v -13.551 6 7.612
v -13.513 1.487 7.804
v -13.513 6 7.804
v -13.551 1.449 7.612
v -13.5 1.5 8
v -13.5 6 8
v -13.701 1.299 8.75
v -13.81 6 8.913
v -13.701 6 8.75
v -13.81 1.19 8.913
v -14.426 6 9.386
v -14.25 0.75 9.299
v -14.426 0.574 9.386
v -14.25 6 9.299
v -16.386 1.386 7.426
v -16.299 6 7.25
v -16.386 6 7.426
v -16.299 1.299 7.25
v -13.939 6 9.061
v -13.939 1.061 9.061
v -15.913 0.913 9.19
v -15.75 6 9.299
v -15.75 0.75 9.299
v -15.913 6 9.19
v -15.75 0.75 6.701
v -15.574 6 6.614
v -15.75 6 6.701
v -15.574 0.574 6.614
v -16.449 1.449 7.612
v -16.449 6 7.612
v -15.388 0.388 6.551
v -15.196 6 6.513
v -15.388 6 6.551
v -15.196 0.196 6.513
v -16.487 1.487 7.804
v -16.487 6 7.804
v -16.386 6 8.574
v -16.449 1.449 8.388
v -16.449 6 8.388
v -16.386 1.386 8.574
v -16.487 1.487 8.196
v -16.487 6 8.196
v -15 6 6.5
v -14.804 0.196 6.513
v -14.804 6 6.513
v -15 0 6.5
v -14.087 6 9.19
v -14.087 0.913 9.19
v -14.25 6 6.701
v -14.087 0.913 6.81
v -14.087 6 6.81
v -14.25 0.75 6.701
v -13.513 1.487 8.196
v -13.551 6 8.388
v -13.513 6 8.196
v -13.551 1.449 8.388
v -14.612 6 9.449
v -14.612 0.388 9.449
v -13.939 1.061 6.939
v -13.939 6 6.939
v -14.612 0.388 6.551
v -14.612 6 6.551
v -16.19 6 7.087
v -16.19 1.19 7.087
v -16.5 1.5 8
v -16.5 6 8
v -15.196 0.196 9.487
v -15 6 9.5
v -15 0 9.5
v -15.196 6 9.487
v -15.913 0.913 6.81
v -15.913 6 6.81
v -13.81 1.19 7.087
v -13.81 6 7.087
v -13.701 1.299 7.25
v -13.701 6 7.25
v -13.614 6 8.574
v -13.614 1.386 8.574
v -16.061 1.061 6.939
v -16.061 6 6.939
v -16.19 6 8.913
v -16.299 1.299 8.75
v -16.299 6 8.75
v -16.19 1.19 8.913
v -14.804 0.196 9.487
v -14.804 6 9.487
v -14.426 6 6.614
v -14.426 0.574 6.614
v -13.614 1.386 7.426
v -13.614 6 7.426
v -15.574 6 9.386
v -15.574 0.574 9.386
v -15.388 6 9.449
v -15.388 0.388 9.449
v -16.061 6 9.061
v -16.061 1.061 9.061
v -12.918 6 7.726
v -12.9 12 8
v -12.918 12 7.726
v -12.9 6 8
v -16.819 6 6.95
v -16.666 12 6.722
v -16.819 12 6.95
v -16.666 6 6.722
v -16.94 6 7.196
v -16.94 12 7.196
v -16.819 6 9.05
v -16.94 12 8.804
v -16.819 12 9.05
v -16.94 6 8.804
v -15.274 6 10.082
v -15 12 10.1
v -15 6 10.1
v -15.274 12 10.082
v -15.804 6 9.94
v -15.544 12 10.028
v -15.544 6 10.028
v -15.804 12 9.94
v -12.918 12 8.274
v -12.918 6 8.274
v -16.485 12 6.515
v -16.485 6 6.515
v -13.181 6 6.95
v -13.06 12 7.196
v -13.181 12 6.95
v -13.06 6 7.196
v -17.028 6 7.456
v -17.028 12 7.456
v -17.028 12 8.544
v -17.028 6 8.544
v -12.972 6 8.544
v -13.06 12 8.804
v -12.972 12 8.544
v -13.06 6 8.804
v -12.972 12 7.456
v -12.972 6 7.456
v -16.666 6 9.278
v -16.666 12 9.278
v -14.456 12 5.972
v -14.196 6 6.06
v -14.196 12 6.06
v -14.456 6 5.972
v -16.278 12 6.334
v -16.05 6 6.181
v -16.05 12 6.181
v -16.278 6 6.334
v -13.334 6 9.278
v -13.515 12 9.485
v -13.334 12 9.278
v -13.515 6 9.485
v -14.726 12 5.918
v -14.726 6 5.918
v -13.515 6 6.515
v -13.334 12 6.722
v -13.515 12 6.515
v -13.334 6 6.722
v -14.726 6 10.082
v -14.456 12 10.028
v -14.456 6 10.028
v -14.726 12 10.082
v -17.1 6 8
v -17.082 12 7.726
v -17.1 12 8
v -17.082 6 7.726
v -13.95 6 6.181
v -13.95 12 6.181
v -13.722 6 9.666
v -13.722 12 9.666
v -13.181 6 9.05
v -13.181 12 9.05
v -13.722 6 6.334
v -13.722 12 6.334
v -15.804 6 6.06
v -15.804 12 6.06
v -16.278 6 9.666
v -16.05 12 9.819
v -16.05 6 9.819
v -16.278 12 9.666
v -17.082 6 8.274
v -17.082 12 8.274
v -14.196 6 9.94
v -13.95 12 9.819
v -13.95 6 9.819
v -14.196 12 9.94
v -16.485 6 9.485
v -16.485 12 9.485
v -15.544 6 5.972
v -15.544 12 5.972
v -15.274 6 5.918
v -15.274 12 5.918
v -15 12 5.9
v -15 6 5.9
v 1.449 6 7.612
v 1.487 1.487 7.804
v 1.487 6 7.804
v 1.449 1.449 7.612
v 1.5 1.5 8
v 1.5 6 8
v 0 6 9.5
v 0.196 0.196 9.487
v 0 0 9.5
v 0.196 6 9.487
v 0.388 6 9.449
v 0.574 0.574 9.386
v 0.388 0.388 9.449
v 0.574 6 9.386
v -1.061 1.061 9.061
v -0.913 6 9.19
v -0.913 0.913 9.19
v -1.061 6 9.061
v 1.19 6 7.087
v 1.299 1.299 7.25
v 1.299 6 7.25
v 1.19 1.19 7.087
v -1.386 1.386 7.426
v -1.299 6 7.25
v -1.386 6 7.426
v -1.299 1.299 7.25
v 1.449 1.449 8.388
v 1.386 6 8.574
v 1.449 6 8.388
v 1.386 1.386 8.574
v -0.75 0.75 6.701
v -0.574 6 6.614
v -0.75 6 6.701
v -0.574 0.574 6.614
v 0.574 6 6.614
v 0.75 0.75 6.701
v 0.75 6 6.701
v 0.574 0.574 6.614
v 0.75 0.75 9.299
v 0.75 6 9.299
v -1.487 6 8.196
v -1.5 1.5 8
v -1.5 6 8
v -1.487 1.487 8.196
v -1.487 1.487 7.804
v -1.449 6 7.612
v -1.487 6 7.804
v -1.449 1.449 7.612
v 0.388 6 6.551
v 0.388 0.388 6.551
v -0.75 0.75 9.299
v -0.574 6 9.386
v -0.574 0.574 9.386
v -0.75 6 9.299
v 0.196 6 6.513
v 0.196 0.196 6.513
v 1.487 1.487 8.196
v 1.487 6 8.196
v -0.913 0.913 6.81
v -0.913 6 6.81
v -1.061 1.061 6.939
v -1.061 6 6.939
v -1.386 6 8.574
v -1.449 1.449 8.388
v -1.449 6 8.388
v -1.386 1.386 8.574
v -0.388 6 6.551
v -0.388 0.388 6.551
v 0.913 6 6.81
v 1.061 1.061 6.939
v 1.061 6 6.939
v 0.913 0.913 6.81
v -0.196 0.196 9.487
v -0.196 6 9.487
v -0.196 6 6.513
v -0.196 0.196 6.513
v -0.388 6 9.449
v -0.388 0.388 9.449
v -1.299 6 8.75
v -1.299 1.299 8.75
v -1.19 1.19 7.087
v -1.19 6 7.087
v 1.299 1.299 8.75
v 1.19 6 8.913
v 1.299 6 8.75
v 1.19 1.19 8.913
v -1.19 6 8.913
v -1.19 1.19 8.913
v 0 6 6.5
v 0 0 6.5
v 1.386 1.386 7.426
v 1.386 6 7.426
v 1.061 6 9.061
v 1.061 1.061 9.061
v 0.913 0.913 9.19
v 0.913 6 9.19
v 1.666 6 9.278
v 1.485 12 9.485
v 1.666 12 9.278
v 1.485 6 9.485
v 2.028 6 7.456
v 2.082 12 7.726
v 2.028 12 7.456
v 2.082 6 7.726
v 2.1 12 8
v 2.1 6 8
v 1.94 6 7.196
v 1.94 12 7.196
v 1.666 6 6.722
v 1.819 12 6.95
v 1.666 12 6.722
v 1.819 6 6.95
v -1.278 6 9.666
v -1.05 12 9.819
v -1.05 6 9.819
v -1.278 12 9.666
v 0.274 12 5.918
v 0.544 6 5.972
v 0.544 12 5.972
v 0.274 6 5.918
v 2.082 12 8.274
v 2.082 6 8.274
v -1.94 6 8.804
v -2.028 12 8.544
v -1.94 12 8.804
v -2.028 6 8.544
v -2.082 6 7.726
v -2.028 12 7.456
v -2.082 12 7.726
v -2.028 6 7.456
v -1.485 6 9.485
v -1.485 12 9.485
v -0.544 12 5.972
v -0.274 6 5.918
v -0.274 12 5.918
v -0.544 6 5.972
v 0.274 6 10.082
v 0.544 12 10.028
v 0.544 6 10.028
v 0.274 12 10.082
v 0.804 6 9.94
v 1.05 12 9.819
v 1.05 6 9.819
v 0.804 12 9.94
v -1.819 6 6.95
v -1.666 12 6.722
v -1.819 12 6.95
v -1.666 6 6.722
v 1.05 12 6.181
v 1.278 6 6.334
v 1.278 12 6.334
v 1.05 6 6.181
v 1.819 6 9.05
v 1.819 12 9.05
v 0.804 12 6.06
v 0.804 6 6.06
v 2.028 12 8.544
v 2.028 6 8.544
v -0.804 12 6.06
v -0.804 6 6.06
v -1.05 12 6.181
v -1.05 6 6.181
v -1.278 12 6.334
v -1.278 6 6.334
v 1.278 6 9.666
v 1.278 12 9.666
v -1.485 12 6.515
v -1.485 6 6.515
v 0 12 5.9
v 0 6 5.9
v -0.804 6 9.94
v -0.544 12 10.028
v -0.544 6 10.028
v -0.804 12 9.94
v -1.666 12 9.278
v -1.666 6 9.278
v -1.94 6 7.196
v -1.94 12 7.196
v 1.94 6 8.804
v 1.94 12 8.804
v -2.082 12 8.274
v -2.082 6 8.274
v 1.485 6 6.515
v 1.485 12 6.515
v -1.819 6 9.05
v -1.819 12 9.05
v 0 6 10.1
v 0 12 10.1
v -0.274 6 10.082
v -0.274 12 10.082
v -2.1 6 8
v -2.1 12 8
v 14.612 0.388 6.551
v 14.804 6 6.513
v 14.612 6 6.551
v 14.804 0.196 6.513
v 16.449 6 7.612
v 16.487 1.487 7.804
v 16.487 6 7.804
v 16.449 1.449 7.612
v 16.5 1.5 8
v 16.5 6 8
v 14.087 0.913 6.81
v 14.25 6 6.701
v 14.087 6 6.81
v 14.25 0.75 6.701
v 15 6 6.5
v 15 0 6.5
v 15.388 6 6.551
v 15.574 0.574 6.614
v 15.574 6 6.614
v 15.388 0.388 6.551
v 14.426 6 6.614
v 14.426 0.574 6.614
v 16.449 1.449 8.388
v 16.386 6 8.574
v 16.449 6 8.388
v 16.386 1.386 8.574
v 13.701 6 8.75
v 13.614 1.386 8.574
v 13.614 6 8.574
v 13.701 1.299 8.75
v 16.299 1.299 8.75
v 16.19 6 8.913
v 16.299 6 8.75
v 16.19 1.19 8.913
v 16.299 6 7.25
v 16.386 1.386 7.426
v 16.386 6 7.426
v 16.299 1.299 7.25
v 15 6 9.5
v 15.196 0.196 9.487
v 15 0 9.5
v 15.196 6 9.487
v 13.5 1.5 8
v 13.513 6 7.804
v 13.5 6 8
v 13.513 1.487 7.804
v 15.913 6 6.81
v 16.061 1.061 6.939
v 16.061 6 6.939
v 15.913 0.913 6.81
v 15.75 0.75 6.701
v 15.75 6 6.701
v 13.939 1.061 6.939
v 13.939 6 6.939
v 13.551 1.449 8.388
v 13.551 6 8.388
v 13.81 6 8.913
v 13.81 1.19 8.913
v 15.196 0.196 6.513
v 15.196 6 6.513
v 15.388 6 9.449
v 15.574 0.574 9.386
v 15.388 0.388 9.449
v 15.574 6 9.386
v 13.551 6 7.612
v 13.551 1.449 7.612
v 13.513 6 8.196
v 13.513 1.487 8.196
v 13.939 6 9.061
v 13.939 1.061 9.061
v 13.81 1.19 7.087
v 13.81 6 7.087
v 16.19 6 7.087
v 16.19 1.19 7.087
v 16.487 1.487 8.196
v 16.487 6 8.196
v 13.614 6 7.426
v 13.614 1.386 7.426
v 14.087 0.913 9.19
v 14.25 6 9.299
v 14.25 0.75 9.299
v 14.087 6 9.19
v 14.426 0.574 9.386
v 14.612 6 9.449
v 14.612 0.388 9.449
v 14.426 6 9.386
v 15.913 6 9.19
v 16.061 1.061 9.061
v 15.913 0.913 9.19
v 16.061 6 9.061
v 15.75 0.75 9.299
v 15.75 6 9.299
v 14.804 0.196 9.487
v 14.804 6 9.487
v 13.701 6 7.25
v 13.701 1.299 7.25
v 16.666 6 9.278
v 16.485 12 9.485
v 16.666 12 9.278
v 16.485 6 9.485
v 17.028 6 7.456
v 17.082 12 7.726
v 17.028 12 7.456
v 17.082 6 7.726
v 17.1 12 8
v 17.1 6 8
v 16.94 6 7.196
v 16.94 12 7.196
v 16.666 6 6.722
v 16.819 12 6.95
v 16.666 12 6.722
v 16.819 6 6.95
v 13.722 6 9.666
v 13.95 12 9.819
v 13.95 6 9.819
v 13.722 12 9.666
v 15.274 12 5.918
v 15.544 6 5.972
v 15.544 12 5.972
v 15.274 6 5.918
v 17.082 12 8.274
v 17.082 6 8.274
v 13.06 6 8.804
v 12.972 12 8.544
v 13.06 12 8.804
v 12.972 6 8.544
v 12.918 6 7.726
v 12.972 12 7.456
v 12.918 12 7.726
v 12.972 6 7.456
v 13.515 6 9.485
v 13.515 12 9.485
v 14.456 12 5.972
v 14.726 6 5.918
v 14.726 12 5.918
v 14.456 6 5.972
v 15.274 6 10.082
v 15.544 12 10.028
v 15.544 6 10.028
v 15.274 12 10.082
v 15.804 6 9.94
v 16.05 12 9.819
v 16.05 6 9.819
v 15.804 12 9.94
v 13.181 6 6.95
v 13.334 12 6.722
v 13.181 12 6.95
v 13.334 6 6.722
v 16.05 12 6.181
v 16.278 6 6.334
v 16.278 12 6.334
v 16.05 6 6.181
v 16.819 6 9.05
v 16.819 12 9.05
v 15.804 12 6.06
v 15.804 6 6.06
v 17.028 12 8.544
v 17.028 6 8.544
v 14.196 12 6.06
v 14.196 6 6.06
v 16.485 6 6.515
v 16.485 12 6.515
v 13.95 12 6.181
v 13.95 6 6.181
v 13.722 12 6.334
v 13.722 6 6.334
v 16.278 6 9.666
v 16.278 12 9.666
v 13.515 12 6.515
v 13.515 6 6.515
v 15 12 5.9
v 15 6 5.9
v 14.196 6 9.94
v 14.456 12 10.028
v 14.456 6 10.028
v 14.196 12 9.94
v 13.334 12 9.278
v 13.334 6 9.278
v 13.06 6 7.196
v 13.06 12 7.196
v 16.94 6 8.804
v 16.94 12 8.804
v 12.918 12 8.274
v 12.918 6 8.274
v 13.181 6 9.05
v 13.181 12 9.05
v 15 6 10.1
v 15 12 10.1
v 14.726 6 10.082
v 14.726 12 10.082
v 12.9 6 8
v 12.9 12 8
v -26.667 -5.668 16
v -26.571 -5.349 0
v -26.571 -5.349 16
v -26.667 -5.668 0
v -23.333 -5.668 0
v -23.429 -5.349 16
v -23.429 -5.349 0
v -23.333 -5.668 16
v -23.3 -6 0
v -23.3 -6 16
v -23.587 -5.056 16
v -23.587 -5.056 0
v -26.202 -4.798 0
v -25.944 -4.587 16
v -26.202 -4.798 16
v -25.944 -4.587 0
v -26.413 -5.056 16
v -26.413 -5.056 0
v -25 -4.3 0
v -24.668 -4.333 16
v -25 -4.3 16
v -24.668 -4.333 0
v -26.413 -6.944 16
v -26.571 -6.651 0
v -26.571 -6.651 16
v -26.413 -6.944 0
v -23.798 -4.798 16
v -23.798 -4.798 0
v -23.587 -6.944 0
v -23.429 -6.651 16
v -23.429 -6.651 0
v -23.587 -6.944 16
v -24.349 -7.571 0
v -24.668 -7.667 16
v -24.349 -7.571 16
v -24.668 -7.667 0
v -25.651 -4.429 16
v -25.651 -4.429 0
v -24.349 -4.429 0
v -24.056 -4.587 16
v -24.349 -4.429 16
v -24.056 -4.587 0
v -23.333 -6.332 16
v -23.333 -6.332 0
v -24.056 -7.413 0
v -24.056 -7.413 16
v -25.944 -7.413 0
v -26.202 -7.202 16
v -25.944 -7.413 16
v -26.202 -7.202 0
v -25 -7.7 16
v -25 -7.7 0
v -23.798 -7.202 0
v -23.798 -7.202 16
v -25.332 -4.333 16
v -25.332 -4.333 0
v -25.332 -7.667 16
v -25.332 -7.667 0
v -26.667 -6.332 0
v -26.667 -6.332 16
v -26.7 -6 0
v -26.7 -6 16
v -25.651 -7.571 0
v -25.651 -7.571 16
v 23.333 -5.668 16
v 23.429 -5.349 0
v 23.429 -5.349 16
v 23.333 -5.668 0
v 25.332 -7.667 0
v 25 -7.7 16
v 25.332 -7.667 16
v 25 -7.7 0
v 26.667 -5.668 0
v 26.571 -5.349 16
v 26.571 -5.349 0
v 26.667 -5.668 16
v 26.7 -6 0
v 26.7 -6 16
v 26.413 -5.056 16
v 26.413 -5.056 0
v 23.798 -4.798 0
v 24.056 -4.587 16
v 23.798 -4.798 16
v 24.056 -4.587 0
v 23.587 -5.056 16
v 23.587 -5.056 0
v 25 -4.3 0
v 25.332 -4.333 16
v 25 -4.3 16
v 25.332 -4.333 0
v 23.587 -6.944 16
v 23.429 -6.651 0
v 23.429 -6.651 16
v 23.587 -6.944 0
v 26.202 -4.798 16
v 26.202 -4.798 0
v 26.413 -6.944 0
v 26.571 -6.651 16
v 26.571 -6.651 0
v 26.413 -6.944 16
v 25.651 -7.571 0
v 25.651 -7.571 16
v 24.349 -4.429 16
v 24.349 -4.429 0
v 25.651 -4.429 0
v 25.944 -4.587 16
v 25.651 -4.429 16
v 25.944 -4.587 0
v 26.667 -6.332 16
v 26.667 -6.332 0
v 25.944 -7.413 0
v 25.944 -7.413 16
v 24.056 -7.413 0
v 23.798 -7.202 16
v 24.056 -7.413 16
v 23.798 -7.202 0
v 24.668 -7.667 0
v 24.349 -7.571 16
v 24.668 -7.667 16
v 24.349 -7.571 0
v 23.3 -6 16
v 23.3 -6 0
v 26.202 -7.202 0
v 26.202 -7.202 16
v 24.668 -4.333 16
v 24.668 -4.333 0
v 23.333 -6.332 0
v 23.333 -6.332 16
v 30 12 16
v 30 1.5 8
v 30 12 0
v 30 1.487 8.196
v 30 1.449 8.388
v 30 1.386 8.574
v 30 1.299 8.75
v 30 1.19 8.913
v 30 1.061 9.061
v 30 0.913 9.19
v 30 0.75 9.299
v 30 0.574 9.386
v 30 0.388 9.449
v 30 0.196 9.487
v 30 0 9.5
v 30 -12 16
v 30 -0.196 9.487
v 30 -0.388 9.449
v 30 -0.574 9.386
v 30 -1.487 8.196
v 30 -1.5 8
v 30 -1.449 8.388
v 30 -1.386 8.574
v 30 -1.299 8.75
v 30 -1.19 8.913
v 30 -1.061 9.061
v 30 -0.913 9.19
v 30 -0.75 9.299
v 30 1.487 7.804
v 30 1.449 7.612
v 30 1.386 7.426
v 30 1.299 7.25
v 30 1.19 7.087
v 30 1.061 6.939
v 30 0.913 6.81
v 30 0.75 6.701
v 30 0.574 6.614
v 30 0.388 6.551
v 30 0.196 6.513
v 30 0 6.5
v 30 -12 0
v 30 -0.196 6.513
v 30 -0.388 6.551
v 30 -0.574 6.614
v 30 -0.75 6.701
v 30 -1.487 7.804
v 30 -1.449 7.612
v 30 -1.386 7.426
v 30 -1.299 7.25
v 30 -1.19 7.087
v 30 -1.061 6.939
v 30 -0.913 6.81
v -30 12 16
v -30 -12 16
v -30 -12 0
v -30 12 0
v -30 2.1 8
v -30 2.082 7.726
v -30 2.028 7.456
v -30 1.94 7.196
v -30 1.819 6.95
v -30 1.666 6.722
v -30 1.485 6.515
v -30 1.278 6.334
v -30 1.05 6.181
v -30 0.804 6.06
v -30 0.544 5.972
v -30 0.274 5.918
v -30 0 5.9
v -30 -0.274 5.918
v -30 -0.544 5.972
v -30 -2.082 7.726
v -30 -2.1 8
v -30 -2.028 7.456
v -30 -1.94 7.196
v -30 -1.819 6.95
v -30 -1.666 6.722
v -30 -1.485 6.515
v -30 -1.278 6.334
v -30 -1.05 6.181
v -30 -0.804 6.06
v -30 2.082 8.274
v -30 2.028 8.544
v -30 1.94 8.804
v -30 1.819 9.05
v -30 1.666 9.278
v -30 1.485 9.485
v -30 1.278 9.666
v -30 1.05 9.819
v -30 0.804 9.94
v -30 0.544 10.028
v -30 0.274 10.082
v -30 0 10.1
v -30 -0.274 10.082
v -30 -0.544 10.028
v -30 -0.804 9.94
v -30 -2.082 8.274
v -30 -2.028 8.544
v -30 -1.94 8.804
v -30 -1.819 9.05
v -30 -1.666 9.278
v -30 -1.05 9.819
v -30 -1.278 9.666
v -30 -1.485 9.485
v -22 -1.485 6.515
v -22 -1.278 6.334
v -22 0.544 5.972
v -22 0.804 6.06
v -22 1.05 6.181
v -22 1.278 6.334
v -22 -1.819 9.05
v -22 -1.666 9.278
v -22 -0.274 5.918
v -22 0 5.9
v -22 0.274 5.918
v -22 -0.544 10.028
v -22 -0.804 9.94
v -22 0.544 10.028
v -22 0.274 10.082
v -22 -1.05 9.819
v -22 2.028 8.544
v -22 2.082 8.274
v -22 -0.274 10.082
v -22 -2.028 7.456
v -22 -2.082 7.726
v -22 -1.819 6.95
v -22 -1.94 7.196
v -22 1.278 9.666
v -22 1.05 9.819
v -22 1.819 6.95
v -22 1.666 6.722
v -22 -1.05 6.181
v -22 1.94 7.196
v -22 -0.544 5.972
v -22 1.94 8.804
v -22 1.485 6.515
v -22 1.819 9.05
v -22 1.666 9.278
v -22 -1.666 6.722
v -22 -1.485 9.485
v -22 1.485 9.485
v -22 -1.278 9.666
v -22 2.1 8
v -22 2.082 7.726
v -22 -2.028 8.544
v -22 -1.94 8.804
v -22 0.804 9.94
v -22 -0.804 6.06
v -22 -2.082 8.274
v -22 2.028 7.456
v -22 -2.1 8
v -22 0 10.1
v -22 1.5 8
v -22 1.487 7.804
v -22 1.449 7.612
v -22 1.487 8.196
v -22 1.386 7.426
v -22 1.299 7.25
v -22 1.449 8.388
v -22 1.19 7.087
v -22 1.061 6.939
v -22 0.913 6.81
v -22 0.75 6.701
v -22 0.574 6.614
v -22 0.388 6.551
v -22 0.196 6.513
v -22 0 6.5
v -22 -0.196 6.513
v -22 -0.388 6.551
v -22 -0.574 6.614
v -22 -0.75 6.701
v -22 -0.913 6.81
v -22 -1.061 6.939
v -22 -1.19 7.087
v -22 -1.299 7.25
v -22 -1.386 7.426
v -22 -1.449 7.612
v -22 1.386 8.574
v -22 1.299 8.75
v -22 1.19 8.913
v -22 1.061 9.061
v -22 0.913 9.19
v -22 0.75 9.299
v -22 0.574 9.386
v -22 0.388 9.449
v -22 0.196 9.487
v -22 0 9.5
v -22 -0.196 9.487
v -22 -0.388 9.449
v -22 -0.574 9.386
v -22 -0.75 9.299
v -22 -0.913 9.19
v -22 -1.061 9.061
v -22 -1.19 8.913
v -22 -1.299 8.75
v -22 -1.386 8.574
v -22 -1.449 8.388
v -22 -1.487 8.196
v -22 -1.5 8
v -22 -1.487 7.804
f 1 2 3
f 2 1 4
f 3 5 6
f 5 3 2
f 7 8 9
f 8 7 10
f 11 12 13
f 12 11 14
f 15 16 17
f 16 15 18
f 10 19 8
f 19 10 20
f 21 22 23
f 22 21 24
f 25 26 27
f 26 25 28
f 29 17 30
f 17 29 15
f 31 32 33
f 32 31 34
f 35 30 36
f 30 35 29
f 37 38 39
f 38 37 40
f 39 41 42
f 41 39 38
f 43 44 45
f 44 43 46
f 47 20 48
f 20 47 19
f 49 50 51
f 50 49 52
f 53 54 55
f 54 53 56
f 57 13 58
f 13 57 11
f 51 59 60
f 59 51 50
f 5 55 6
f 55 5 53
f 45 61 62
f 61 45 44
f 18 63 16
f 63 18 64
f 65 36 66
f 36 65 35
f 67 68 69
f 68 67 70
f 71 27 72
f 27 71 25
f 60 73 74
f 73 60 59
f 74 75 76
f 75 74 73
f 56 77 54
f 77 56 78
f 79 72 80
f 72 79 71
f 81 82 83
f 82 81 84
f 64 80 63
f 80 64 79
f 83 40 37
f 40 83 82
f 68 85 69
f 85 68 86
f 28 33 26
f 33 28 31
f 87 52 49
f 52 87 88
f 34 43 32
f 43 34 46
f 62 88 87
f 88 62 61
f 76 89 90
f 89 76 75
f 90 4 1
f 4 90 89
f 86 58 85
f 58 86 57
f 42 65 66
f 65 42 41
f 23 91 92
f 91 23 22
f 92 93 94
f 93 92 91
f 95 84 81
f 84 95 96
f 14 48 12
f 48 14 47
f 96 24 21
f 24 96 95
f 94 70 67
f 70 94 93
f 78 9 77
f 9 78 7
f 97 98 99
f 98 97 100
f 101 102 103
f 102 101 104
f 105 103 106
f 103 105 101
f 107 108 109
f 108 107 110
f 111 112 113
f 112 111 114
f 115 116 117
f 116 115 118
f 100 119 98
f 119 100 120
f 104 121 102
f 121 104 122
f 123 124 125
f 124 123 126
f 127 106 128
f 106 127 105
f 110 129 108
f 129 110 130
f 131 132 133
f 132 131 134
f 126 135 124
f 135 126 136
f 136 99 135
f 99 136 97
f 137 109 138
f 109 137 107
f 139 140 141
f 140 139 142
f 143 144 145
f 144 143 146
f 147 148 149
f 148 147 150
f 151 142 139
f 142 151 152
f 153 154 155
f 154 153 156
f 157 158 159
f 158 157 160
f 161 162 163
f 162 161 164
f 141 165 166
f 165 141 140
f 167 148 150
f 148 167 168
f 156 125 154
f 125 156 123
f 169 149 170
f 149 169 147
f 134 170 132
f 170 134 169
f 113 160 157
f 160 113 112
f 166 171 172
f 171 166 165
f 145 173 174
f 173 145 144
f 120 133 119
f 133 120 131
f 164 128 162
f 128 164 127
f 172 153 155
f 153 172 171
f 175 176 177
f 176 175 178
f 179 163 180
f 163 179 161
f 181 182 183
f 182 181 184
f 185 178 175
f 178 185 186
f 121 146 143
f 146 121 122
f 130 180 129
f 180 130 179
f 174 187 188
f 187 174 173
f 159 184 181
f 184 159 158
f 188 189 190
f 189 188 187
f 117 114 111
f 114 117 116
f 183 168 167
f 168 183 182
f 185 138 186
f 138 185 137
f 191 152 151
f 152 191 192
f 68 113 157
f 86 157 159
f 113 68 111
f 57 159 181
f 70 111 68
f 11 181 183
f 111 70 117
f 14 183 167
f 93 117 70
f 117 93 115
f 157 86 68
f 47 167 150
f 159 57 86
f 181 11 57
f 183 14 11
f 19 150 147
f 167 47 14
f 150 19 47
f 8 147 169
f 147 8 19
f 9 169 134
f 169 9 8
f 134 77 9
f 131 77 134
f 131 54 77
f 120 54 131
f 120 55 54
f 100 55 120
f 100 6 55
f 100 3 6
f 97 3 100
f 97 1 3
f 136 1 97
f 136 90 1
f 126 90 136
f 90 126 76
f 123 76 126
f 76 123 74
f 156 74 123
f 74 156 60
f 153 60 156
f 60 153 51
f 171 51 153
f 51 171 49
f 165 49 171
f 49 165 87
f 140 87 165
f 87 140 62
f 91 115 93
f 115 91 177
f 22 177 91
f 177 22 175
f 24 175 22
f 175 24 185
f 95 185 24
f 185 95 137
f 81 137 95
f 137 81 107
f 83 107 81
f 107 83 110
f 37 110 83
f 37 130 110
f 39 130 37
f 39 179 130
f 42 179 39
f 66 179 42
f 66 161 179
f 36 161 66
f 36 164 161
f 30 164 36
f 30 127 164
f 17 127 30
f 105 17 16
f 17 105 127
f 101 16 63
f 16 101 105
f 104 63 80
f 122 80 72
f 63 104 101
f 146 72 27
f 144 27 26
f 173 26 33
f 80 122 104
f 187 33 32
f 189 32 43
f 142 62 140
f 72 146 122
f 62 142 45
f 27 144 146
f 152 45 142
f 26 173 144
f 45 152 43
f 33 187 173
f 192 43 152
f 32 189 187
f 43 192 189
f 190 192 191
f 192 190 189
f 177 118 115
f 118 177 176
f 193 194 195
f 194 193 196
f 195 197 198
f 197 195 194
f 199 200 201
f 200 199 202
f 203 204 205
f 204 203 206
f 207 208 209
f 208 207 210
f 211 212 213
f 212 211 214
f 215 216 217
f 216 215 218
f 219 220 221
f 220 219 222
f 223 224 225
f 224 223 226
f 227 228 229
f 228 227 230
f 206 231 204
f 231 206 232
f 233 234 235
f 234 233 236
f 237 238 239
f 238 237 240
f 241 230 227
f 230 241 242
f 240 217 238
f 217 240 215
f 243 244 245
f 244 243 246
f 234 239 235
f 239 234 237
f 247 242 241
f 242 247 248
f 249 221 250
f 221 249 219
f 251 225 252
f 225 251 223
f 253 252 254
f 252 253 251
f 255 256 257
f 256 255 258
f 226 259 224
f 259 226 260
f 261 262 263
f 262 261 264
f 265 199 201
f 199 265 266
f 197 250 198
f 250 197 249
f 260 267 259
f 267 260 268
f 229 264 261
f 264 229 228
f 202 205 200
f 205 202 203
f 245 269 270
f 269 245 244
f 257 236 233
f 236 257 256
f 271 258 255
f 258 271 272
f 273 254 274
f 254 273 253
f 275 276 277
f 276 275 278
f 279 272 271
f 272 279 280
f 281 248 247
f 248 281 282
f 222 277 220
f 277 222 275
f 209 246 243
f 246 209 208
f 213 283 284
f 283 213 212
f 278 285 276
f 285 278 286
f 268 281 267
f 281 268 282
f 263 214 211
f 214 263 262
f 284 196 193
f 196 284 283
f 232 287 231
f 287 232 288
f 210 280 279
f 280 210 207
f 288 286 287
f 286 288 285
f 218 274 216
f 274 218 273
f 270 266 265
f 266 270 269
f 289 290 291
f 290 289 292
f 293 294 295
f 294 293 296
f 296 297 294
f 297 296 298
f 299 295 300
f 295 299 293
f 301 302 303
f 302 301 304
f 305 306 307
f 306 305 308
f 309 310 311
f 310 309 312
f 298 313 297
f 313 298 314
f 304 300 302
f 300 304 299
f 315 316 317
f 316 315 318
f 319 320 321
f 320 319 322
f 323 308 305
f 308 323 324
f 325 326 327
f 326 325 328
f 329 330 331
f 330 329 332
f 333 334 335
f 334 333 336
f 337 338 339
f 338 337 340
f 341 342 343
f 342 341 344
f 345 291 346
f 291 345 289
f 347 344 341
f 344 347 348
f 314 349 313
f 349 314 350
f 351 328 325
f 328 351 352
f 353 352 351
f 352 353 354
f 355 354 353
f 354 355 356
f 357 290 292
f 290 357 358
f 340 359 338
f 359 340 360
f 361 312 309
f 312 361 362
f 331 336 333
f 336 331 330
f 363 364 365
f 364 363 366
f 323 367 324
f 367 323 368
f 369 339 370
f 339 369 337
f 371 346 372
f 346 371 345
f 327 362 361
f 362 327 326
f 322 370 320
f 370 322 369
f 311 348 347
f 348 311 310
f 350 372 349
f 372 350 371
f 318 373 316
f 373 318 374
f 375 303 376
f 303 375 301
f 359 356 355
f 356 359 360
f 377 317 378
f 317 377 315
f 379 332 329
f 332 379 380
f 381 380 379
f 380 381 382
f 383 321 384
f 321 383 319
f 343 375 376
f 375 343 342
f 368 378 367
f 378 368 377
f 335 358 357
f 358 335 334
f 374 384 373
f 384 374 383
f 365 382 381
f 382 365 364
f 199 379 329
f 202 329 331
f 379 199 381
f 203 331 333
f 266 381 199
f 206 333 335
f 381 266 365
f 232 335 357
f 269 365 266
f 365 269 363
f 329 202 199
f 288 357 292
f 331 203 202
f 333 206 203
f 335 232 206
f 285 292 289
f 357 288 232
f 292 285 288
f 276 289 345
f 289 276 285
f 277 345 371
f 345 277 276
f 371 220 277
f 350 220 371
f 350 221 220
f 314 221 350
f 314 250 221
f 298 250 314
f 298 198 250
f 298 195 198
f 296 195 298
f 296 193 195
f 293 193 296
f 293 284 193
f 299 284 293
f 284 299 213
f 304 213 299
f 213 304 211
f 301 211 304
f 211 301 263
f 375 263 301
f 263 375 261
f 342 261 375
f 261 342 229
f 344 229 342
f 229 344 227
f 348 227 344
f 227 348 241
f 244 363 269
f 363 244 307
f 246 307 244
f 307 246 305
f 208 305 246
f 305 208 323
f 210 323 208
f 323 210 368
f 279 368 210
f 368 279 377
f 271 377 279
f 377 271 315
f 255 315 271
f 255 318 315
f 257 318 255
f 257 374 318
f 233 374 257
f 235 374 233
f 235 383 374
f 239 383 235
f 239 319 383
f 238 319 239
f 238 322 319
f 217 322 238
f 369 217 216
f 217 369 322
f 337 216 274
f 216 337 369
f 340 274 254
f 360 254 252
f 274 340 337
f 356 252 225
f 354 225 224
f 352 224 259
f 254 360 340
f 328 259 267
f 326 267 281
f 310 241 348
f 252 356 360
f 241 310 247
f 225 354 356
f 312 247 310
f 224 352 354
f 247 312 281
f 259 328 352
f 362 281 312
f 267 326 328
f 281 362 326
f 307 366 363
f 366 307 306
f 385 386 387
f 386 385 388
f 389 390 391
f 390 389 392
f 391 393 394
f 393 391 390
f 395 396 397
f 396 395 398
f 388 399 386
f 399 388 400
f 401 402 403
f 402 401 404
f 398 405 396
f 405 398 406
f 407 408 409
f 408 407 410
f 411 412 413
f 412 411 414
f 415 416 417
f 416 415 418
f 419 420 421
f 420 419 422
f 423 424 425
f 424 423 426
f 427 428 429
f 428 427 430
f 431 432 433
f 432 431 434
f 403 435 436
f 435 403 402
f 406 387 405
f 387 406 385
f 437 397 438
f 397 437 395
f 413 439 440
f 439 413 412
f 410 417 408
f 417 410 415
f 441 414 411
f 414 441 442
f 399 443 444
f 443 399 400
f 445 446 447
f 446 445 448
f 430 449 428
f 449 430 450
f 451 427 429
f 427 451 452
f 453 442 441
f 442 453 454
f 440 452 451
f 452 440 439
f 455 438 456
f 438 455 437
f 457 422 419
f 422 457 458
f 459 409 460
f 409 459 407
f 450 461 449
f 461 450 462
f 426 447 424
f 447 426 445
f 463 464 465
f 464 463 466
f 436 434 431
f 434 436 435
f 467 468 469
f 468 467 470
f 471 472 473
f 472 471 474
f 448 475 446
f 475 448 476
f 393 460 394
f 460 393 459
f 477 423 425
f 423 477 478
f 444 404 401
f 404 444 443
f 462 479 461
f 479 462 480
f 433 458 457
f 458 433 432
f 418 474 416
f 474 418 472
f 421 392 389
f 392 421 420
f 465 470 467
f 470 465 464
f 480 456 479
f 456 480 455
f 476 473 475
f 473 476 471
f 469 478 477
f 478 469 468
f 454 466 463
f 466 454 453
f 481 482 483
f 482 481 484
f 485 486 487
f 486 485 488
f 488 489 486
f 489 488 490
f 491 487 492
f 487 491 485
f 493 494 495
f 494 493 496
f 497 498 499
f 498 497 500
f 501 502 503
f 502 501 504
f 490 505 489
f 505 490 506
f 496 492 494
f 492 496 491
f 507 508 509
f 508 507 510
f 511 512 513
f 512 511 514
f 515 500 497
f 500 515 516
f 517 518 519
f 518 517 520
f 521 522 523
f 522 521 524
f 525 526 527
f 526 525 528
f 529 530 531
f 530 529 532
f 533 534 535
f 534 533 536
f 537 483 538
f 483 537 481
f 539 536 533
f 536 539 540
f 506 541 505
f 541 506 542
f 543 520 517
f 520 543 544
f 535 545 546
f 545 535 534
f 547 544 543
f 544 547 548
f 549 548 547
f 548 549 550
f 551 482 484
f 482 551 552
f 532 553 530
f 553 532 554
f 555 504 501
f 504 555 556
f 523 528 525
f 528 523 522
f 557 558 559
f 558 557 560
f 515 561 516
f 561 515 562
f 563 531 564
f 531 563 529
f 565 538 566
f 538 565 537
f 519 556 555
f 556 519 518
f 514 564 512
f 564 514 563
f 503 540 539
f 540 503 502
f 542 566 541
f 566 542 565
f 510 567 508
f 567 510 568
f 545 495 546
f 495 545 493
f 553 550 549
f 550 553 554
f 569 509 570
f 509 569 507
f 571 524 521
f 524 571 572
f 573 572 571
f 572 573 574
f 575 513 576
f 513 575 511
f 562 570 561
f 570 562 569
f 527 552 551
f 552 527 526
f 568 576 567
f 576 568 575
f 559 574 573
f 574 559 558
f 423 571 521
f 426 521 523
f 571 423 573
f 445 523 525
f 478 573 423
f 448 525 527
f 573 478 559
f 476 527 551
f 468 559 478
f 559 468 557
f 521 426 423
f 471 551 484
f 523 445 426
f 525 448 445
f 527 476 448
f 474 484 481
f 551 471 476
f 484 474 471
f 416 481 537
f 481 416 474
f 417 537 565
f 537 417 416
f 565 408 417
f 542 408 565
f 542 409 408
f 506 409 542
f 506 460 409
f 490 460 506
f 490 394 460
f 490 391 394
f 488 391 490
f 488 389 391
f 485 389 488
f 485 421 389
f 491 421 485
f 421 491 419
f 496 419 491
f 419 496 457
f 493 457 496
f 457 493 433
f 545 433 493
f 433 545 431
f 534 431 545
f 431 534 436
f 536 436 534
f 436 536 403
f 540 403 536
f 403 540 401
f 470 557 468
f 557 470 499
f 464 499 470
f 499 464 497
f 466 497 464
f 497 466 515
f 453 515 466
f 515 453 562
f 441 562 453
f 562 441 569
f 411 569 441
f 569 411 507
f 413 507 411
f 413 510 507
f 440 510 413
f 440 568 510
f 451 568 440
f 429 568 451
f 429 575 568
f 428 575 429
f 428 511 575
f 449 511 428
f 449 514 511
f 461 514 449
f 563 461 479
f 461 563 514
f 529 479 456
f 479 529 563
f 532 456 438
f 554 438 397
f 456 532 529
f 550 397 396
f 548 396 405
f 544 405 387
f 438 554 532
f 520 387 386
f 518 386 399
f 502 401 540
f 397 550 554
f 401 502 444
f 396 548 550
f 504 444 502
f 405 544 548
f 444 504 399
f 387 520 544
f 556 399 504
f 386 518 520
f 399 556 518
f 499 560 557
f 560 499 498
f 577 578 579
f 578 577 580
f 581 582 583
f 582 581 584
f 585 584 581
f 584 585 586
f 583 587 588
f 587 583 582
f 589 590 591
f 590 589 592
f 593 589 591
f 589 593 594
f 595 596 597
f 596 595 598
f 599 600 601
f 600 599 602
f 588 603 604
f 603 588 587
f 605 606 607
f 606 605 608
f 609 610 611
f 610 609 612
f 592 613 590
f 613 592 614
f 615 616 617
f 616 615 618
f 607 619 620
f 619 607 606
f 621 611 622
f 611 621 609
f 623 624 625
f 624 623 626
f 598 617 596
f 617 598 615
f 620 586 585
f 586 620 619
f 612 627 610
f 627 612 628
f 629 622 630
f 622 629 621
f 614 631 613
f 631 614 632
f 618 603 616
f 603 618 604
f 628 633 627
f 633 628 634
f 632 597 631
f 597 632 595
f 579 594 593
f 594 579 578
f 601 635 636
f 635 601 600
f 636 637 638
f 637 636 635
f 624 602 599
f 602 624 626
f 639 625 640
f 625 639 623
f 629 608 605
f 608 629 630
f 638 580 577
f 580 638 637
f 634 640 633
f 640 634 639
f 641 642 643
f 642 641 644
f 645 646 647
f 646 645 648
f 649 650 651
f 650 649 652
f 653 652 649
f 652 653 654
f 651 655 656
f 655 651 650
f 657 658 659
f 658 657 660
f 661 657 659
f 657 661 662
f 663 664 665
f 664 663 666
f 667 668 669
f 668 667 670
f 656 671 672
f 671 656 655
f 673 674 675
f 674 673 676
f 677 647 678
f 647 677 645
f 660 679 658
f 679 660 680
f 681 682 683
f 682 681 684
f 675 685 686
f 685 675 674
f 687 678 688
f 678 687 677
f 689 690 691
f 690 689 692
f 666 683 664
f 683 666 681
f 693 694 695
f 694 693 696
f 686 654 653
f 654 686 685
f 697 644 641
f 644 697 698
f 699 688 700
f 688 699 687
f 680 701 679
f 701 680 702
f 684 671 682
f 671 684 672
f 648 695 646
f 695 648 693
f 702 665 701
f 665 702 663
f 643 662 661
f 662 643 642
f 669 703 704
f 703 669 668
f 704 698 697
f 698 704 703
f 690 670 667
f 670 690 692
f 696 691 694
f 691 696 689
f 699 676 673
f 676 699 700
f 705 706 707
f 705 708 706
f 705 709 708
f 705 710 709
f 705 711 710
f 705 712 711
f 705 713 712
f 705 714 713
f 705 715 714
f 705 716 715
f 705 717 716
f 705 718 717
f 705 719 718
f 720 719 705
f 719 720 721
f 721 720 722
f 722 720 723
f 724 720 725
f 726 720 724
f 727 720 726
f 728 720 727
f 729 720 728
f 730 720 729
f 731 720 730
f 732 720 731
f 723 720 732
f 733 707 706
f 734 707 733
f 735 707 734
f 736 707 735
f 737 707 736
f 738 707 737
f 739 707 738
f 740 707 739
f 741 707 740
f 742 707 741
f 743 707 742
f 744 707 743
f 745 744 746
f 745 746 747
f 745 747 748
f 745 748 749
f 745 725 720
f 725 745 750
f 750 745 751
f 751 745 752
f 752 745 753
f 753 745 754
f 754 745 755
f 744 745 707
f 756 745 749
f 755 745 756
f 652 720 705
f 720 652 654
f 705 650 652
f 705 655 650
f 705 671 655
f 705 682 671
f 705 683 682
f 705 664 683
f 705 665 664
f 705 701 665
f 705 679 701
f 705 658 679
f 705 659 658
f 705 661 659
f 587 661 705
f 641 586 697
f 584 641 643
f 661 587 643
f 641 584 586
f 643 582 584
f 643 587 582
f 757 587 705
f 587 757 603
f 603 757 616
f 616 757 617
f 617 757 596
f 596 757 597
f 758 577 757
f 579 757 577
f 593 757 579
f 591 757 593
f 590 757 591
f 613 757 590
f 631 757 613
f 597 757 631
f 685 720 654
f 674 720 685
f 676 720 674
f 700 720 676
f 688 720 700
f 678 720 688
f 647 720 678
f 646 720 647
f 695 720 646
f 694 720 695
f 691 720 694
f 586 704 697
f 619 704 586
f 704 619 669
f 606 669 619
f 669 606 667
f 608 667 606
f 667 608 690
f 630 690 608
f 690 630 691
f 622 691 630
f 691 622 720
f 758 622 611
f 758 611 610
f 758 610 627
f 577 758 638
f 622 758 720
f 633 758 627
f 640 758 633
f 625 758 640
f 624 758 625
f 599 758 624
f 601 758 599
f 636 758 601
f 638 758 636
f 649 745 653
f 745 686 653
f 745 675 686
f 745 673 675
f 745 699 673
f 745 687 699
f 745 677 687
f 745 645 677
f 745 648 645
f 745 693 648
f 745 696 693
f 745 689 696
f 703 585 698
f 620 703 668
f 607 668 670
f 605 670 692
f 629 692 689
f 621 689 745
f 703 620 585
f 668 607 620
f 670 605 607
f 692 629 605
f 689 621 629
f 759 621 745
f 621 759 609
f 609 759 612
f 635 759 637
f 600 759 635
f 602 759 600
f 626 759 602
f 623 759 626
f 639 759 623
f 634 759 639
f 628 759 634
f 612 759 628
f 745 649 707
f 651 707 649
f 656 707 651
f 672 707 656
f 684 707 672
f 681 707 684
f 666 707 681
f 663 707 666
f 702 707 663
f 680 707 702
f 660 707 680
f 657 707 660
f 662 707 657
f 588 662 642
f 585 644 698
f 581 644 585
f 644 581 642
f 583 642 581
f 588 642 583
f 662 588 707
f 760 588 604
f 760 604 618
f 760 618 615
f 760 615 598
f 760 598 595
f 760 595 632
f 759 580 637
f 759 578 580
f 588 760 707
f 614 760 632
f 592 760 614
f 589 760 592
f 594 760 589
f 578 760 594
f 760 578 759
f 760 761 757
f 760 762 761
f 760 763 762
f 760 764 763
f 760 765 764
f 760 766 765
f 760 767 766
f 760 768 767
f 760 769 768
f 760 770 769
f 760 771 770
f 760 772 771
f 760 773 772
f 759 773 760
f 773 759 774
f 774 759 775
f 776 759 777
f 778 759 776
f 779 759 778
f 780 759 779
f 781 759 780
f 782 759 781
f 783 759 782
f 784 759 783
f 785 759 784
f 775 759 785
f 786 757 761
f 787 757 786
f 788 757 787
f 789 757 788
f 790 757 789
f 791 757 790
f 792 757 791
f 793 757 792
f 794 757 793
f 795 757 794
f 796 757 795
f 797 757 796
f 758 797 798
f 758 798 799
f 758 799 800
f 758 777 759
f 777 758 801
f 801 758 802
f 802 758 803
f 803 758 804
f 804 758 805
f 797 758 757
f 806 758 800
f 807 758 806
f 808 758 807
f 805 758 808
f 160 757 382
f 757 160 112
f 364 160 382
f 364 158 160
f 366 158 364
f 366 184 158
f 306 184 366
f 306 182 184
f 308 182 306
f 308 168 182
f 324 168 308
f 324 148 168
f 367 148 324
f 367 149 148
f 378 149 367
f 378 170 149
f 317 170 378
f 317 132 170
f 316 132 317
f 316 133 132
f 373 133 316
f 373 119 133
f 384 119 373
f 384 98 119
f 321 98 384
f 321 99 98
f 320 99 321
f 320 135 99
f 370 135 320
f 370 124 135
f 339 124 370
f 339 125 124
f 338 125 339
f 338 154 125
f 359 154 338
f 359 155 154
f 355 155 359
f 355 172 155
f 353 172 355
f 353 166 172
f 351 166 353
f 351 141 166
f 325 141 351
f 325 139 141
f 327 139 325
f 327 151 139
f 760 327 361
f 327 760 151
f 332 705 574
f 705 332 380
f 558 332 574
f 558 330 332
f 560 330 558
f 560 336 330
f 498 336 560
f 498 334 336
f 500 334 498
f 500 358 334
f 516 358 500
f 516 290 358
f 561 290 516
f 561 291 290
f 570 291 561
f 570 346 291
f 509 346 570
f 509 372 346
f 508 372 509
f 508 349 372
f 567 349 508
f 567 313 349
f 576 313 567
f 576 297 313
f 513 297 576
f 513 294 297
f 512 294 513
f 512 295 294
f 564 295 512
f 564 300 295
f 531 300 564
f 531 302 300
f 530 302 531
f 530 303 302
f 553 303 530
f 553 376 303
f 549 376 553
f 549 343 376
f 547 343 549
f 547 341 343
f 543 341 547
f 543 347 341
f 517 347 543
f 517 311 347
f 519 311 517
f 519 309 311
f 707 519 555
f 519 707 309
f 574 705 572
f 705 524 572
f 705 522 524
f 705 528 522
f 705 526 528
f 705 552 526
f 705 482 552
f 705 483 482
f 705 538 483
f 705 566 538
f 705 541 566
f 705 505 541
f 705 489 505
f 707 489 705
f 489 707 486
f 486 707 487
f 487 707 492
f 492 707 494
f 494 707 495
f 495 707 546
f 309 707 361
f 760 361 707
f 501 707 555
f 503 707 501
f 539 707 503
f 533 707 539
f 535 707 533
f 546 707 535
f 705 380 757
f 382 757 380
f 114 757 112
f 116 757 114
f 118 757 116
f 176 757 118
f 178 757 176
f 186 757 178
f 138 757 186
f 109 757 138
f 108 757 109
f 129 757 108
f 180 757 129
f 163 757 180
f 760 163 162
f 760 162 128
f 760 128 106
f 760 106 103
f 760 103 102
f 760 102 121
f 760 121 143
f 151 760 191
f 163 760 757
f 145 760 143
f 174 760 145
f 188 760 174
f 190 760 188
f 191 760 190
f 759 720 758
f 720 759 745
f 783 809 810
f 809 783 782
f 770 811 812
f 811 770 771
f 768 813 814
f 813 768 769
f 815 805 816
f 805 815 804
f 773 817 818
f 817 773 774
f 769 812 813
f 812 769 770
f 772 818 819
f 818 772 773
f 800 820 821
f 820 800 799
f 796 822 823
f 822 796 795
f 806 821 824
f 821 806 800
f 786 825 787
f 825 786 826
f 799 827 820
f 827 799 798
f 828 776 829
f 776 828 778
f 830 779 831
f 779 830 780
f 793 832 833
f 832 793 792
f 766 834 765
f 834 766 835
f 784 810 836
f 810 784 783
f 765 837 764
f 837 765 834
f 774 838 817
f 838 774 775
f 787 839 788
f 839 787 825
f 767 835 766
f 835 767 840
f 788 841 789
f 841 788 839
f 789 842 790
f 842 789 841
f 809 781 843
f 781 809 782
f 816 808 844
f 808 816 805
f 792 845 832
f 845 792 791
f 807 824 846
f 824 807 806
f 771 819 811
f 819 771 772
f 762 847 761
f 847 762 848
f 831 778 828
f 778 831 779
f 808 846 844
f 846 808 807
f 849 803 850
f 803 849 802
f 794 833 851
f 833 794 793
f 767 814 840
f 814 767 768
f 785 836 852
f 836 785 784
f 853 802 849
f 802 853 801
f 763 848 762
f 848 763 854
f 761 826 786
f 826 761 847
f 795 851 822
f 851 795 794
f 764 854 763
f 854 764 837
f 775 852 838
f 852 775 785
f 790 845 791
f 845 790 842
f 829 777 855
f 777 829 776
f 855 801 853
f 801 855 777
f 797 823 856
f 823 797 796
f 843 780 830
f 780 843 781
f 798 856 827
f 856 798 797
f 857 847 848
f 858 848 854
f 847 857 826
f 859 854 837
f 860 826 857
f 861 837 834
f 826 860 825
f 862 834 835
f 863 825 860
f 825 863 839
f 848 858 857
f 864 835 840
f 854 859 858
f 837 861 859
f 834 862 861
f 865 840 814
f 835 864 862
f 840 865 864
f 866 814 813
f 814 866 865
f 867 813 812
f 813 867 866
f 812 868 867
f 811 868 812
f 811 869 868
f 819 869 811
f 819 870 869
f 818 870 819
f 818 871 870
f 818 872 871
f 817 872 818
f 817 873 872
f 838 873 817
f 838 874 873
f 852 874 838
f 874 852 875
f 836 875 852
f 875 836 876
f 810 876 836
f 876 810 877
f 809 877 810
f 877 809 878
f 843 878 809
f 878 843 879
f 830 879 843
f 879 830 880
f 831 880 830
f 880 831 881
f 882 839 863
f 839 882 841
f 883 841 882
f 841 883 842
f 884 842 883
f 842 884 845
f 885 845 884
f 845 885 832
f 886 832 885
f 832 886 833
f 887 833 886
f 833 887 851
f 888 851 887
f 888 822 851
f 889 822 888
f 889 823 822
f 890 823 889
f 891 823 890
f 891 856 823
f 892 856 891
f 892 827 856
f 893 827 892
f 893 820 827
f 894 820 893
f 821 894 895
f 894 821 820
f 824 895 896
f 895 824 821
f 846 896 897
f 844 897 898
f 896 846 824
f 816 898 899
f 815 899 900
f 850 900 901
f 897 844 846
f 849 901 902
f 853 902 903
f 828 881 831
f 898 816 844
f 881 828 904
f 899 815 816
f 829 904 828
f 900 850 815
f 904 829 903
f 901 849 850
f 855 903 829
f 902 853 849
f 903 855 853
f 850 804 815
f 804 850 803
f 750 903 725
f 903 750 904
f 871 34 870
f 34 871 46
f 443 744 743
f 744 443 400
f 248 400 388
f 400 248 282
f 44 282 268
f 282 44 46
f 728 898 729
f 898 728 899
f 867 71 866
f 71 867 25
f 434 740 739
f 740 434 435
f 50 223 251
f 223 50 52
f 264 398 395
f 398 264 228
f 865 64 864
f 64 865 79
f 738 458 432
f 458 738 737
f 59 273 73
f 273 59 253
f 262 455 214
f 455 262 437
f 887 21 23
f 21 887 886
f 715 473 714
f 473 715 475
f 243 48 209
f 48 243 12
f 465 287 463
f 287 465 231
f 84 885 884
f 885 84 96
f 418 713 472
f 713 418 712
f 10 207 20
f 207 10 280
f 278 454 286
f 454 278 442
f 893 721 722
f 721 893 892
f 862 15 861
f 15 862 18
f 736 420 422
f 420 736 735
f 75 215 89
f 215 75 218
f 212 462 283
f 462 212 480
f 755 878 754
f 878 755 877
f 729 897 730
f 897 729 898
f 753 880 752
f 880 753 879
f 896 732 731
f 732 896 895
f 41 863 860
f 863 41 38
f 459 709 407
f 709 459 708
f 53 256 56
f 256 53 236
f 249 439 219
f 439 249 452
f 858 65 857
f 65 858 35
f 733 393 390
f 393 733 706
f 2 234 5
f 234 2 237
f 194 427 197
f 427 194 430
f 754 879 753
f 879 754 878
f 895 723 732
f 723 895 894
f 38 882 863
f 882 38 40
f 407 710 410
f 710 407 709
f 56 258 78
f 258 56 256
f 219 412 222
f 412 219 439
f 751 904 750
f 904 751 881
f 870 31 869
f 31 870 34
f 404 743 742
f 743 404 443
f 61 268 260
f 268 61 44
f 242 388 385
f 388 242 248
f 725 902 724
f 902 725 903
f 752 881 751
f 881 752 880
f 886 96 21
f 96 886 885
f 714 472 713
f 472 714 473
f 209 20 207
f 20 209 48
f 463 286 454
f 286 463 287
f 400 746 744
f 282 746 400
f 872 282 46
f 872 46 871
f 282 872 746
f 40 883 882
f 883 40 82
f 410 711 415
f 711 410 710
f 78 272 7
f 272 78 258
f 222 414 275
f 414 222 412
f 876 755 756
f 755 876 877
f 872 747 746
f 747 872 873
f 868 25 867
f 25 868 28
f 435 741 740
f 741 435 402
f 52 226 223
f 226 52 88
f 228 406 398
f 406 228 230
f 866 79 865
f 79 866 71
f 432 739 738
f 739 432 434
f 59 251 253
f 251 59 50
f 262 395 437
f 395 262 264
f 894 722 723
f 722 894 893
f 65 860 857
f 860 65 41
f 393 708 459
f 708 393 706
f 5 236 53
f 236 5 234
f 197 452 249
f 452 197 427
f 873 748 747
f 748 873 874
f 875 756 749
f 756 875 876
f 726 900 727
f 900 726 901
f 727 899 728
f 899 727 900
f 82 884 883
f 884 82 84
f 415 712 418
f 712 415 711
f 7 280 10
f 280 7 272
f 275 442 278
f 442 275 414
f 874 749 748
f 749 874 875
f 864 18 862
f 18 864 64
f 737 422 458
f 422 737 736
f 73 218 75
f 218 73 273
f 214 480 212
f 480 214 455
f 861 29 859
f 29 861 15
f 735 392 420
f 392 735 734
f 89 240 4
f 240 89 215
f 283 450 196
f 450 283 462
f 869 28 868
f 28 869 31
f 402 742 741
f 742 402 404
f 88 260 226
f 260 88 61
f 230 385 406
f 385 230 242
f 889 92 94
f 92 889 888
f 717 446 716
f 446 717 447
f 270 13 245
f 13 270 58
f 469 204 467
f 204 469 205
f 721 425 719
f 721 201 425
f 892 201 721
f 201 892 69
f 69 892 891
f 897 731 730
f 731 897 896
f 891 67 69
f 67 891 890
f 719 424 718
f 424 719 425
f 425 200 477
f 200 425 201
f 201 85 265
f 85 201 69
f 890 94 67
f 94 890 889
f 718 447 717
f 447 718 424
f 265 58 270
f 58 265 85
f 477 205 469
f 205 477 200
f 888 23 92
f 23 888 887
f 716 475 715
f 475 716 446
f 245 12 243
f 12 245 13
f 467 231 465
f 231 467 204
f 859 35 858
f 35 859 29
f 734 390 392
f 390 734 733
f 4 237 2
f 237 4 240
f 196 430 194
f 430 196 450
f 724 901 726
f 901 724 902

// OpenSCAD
// KNOWN-WRONG PART (must fail): the main channel runs on to the +X face (open) instead of stopping at x = 15
// Manifold block: one tubing inlet split into three outlets through internal channels
// Category: hardware. 3 mm channels in the mid-plane: an inlet socket on the -X face feeds a main
// channel that ends inside the block; three branches run to sockets on the +Y face.
// Print: PETG, lying on its bottom face, 0.15 mm layers, 100 % infill (watertight walls);
// the 3 mm channels bridge cleanly. Leak-test before use; glue the tubing into the sockets.
// SPDX-License-Identifier: CERN-OHL-P-2.0

/* [Manifold] */
block = [60, 24, 16];     // X, Y, Z [mm], centred in X and Y
ch_z = 8;                 // channel mid-plane
ch_d = 3;
sock_d = 4.2;             // socket for 4 mm OD tubing
inlet_sock = 8;           // inlet socket depth (from the -X face)
outlet_sock = 6;          // outlet socket depth (from the +Y face)
main_end = 15;            // the main channel stops at x = 15
outlets_x = [-15, 0, 15];
screw_d = 3.4;            // M3 clearance
screws = [[-25, -6], [25, -6]];

/* [Hidden] */
eps = 0.01;

difference() {
    translate([-block.x / 2, -block.y / 2, 0]) cube(block);
    // inlet socket and main channel along +X
    translate([-block.x / 2 - 1, 0, ch_z]) rotate([0, 90, 0]) cylinder(d = sock_d, h = inlet_sock + 1, $fn = 48);
    translate([-block.x / 2 - 1, 0, ch_z]) rotate([0, 90, 0]) cylinder(d = ch_d, h = block.x + 2, $fn = 48);
    // outlet branches along +Y, each ending in a socket
    for (x = outlets_x) {
        translate([x, 0, ch_z]) rotate([-90, 0, 0]) cylinder(d = ch_d, h = block.y / 2 + 1, $fn = 48);
        translate([x, block.y / 2 - outlet_sock, ch_z]) rotate([-90, 0, 0]) cylinder(d = sock_d, h = outlet_sock + 1, $fn = 48);
    }
    for (p = screws) translate([p.x, p.y, -1]) cylinder(d = screw_d, h = block.z + 2, $fn = 32);
}
